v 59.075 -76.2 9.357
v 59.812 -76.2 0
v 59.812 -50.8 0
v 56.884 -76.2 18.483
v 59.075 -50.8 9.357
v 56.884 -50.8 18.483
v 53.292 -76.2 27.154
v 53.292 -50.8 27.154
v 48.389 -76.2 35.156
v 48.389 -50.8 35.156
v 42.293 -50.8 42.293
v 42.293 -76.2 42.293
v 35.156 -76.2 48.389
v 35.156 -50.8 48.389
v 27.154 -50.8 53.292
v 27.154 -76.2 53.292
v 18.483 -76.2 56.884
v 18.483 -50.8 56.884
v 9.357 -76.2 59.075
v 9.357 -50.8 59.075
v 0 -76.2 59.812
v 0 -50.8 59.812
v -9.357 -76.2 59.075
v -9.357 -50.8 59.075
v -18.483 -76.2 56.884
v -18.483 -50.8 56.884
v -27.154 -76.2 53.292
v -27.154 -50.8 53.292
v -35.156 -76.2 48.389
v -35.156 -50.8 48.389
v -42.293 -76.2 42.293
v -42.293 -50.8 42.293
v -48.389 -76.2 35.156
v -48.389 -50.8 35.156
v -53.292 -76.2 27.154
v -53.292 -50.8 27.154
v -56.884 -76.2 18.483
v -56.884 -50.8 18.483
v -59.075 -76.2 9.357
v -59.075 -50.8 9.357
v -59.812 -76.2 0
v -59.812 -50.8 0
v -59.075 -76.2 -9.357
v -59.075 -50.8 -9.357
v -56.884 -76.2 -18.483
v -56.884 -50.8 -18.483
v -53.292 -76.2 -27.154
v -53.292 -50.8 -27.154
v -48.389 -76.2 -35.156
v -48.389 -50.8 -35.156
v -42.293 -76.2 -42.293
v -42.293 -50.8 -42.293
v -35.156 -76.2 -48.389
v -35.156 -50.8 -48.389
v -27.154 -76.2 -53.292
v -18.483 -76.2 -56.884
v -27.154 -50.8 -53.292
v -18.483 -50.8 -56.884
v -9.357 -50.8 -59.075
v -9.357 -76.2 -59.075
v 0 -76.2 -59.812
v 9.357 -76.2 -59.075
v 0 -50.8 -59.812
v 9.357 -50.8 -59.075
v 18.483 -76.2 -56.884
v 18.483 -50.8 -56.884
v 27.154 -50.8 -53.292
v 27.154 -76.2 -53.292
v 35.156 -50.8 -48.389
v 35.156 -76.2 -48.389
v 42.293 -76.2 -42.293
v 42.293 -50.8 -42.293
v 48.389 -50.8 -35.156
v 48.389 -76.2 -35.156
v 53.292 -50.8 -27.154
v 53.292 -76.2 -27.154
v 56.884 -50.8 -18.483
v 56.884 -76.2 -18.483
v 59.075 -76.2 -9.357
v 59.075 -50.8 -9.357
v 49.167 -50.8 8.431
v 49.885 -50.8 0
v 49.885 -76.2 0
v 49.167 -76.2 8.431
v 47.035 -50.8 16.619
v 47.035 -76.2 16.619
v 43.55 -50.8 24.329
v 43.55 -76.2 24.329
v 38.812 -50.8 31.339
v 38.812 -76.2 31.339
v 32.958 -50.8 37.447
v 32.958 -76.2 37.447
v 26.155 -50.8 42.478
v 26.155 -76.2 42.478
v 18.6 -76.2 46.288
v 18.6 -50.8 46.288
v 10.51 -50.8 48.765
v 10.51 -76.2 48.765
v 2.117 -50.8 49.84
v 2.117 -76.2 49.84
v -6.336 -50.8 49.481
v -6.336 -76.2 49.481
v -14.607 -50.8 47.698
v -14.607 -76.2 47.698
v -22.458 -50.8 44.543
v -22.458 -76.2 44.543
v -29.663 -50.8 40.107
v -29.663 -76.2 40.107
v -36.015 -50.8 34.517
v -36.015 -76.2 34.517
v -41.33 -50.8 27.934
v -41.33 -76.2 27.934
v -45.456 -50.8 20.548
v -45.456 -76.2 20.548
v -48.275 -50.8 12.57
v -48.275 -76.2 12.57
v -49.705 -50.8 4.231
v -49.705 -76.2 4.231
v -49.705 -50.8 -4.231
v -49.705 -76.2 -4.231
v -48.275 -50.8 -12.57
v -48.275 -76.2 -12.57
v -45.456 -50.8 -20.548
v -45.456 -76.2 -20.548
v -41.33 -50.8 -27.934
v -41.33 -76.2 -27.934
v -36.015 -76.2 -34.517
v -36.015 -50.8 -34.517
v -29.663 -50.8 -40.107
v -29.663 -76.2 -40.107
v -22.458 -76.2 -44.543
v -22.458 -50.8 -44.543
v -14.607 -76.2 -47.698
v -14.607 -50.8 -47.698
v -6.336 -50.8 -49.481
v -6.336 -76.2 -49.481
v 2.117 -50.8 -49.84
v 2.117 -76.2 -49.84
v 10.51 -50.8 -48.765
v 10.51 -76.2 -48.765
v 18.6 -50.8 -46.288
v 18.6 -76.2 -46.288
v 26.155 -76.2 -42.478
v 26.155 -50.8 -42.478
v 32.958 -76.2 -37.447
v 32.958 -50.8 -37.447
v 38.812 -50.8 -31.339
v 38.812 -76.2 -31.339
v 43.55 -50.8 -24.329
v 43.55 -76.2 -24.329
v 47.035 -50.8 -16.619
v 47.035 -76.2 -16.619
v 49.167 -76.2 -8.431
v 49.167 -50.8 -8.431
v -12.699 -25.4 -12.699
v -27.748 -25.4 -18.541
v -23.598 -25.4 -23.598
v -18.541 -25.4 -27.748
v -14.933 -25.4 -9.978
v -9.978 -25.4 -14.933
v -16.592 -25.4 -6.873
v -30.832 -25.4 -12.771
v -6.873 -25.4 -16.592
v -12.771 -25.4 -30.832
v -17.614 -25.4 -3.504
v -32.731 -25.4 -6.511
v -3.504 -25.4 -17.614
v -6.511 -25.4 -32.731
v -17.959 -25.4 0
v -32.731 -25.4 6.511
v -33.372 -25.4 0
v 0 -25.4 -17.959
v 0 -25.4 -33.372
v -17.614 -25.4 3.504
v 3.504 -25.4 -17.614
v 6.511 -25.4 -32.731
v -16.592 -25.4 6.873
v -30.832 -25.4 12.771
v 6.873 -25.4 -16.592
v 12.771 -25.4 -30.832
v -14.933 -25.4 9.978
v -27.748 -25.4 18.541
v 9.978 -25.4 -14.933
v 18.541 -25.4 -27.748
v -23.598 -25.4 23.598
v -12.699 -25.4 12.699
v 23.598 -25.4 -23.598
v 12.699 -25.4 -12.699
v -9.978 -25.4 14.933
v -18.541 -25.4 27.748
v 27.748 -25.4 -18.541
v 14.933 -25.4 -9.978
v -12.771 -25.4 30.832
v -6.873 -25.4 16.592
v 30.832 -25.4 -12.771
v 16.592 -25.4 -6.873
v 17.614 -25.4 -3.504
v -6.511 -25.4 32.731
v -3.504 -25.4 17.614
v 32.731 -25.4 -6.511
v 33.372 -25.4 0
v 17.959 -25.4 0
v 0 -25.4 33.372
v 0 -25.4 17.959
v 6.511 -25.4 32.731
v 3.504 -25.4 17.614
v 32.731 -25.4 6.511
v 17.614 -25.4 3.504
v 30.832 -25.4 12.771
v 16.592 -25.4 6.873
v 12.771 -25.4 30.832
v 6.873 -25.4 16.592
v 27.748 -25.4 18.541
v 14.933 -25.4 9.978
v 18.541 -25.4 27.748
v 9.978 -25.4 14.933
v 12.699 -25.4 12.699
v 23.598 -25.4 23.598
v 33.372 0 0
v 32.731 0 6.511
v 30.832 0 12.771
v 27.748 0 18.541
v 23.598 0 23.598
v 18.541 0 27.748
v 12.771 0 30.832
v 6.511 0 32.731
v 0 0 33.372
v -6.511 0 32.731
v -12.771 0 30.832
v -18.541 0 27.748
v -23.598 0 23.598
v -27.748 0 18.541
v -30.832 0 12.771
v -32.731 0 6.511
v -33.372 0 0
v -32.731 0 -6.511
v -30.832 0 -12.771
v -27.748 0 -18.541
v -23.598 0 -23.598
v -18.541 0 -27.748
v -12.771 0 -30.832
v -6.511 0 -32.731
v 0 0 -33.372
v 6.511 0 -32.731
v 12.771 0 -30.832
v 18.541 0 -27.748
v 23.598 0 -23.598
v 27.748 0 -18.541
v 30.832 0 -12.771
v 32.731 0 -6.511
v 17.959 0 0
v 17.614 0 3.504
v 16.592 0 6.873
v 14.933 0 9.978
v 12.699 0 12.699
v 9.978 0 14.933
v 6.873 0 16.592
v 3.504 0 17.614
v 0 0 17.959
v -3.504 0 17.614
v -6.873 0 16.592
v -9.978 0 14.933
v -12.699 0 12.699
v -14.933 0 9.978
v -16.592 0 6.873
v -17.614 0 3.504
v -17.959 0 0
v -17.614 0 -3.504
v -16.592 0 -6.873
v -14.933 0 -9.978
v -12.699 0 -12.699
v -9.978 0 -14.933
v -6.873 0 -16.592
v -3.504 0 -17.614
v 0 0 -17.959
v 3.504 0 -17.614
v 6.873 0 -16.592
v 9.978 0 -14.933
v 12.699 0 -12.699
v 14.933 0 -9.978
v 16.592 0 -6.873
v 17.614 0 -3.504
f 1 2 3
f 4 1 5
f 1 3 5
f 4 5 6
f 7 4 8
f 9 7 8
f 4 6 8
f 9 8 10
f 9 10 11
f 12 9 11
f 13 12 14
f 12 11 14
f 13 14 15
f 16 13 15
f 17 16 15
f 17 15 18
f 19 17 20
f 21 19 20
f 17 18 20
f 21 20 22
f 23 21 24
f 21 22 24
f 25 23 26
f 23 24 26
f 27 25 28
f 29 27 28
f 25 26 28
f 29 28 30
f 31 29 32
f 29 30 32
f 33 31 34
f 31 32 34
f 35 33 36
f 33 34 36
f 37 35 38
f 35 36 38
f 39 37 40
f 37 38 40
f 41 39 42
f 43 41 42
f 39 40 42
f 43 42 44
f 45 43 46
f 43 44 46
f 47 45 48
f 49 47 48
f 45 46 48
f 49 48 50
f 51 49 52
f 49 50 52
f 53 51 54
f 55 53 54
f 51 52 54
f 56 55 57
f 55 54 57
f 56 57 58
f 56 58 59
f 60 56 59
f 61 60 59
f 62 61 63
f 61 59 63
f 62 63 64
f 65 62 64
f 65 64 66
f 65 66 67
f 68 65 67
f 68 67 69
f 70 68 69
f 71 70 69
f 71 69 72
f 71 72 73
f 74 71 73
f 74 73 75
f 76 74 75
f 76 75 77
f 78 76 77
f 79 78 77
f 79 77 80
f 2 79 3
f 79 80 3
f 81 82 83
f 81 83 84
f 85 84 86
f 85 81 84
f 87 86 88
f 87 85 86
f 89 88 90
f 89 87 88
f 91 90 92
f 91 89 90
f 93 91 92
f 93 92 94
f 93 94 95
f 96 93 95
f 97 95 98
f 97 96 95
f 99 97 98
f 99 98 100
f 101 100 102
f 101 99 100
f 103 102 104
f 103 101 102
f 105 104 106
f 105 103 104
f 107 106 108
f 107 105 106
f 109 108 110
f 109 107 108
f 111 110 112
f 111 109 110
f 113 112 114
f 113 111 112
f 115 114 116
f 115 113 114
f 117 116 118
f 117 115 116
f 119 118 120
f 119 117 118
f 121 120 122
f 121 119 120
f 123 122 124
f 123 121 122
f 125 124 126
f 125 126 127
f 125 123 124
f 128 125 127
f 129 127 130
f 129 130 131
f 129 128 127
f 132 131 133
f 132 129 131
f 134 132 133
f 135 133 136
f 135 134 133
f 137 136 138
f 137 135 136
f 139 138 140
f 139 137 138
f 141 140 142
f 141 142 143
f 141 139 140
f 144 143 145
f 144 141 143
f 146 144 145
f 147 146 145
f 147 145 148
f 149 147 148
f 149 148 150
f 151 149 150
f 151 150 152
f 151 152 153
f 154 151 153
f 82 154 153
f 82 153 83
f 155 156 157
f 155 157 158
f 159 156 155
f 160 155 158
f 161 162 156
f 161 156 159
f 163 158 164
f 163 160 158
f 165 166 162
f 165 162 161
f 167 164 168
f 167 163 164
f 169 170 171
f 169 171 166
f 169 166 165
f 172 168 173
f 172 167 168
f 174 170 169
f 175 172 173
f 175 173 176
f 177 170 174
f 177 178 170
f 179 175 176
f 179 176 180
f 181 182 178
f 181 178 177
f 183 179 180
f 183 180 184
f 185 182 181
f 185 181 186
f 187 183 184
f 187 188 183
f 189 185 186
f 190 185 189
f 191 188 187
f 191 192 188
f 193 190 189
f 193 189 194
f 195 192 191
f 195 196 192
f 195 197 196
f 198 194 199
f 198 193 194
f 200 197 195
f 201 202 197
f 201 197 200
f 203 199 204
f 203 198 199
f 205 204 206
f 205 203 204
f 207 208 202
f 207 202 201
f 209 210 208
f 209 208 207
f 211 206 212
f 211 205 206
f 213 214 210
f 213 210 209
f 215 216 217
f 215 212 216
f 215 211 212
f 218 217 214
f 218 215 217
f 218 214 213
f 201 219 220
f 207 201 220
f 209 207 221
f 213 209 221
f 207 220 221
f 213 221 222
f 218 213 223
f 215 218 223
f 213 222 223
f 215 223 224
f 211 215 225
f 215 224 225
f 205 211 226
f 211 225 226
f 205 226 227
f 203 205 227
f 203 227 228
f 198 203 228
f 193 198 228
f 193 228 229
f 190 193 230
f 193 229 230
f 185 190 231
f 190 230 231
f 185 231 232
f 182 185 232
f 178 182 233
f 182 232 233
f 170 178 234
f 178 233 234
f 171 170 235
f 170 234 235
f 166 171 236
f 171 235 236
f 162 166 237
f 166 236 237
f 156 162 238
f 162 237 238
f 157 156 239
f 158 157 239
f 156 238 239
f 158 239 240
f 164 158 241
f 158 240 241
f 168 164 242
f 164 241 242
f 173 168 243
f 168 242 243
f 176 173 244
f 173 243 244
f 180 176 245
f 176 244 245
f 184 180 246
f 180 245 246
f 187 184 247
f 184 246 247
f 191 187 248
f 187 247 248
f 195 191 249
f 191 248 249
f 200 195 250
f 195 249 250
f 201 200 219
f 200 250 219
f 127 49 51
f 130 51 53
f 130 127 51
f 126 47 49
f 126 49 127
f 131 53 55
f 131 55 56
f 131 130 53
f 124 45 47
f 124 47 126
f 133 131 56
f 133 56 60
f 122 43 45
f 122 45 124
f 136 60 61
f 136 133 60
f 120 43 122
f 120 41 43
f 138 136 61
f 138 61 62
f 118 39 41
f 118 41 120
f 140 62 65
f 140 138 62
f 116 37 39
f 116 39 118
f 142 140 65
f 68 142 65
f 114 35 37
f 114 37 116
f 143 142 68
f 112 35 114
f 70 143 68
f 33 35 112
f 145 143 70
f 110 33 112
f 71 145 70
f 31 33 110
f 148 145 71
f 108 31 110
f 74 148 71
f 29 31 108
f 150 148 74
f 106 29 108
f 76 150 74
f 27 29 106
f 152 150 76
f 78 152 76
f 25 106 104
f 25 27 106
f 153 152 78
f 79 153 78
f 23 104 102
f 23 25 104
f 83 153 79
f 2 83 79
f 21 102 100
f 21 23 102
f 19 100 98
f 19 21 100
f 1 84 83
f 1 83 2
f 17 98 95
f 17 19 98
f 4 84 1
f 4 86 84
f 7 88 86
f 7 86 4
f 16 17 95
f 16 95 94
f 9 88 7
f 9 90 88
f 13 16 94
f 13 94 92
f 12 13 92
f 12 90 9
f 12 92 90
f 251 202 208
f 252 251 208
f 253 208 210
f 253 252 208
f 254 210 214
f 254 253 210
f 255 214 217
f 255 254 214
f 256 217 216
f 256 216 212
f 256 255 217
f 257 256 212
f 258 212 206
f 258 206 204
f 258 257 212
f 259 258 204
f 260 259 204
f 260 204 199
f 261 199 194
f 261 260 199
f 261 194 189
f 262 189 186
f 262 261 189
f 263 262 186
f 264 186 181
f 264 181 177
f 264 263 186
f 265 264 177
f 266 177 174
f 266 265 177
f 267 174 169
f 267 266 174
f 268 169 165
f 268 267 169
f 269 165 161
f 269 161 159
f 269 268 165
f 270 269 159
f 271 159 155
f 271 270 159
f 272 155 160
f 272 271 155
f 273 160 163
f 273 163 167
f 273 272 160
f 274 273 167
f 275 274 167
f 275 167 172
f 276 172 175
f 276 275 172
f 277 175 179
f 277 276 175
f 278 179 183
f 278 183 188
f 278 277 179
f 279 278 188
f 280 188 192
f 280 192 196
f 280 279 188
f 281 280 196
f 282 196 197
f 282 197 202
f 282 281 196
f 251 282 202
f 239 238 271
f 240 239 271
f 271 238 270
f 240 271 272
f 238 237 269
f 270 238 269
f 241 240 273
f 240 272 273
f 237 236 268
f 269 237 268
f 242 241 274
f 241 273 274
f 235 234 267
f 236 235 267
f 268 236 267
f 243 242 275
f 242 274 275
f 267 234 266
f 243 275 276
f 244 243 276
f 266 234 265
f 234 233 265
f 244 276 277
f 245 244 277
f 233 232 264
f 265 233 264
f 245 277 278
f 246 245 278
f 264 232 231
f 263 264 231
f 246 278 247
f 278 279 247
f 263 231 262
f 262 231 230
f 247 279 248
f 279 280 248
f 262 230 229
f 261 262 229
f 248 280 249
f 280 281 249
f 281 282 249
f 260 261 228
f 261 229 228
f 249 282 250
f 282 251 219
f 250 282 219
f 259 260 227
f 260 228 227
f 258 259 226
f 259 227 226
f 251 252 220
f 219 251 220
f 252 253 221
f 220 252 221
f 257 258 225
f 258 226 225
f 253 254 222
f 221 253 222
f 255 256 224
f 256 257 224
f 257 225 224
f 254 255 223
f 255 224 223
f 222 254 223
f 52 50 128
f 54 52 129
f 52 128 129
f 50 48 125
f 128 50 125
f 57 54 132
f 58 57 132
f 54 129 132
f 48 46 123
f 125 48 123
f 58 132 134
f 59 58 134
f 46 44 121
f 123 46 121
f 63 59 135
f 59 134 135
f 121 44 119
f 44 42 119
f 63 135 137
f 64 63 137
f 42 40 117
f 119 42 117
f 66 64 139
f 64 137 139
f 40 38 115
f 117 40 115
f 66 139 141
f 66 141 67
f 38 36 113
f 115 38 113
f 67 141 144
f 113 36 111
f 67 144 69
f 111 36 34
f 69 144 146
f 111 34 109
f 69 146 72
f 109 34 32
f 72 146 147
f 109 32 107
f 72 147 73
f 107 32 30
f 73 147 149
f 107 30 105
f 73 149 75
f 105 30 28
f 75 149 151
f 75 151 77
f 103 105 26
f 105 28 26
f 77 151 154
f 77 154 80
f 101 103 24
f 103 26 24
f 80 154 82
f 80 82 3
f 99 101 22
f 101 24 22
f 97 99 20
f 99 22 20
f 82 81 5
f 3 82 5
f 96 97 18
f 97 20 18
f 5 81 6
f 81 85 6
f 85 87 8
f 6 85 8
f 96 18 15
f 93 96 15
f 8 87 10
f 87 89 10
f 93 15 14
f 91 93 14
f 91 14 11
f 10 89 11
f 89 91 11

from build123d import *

# Parameters (mm, degrees)
F0_R     = 33.3720981505
F0_R_2   = 17.9593209069
F2_DEPTH = 25.4
F3_R     = 59.8115589421
F3_R_2   = 49.8848504809
F4_DEPTH = 25.4


# Not quite as in the source:
# - the program builds the solid bodies; features that only make, move or delete a surface that nothing else refers to are left out


with BuildPart() as f2:
    # F0 (on Front) → F2 (new body)
    with BuildSketch(Plane.XZ):
        Circle(F0_R)
        Circle(F0_R_2, mode=Mode.SUBTRACT)
    extrude(amount=F2_DEPTH)


with BuildPart() as f4:
    # F3 (on offset) → F4 (new body)
    with BuildSketch(Plane.XZ.offset(50.8)):
        Circle(F3_R)
        Circle(F3_R_2, mode=Mode.SUBTRACT)
    extrude(amount=F4_DEPTH)


solid = Compound([f2.part, f4.part])
